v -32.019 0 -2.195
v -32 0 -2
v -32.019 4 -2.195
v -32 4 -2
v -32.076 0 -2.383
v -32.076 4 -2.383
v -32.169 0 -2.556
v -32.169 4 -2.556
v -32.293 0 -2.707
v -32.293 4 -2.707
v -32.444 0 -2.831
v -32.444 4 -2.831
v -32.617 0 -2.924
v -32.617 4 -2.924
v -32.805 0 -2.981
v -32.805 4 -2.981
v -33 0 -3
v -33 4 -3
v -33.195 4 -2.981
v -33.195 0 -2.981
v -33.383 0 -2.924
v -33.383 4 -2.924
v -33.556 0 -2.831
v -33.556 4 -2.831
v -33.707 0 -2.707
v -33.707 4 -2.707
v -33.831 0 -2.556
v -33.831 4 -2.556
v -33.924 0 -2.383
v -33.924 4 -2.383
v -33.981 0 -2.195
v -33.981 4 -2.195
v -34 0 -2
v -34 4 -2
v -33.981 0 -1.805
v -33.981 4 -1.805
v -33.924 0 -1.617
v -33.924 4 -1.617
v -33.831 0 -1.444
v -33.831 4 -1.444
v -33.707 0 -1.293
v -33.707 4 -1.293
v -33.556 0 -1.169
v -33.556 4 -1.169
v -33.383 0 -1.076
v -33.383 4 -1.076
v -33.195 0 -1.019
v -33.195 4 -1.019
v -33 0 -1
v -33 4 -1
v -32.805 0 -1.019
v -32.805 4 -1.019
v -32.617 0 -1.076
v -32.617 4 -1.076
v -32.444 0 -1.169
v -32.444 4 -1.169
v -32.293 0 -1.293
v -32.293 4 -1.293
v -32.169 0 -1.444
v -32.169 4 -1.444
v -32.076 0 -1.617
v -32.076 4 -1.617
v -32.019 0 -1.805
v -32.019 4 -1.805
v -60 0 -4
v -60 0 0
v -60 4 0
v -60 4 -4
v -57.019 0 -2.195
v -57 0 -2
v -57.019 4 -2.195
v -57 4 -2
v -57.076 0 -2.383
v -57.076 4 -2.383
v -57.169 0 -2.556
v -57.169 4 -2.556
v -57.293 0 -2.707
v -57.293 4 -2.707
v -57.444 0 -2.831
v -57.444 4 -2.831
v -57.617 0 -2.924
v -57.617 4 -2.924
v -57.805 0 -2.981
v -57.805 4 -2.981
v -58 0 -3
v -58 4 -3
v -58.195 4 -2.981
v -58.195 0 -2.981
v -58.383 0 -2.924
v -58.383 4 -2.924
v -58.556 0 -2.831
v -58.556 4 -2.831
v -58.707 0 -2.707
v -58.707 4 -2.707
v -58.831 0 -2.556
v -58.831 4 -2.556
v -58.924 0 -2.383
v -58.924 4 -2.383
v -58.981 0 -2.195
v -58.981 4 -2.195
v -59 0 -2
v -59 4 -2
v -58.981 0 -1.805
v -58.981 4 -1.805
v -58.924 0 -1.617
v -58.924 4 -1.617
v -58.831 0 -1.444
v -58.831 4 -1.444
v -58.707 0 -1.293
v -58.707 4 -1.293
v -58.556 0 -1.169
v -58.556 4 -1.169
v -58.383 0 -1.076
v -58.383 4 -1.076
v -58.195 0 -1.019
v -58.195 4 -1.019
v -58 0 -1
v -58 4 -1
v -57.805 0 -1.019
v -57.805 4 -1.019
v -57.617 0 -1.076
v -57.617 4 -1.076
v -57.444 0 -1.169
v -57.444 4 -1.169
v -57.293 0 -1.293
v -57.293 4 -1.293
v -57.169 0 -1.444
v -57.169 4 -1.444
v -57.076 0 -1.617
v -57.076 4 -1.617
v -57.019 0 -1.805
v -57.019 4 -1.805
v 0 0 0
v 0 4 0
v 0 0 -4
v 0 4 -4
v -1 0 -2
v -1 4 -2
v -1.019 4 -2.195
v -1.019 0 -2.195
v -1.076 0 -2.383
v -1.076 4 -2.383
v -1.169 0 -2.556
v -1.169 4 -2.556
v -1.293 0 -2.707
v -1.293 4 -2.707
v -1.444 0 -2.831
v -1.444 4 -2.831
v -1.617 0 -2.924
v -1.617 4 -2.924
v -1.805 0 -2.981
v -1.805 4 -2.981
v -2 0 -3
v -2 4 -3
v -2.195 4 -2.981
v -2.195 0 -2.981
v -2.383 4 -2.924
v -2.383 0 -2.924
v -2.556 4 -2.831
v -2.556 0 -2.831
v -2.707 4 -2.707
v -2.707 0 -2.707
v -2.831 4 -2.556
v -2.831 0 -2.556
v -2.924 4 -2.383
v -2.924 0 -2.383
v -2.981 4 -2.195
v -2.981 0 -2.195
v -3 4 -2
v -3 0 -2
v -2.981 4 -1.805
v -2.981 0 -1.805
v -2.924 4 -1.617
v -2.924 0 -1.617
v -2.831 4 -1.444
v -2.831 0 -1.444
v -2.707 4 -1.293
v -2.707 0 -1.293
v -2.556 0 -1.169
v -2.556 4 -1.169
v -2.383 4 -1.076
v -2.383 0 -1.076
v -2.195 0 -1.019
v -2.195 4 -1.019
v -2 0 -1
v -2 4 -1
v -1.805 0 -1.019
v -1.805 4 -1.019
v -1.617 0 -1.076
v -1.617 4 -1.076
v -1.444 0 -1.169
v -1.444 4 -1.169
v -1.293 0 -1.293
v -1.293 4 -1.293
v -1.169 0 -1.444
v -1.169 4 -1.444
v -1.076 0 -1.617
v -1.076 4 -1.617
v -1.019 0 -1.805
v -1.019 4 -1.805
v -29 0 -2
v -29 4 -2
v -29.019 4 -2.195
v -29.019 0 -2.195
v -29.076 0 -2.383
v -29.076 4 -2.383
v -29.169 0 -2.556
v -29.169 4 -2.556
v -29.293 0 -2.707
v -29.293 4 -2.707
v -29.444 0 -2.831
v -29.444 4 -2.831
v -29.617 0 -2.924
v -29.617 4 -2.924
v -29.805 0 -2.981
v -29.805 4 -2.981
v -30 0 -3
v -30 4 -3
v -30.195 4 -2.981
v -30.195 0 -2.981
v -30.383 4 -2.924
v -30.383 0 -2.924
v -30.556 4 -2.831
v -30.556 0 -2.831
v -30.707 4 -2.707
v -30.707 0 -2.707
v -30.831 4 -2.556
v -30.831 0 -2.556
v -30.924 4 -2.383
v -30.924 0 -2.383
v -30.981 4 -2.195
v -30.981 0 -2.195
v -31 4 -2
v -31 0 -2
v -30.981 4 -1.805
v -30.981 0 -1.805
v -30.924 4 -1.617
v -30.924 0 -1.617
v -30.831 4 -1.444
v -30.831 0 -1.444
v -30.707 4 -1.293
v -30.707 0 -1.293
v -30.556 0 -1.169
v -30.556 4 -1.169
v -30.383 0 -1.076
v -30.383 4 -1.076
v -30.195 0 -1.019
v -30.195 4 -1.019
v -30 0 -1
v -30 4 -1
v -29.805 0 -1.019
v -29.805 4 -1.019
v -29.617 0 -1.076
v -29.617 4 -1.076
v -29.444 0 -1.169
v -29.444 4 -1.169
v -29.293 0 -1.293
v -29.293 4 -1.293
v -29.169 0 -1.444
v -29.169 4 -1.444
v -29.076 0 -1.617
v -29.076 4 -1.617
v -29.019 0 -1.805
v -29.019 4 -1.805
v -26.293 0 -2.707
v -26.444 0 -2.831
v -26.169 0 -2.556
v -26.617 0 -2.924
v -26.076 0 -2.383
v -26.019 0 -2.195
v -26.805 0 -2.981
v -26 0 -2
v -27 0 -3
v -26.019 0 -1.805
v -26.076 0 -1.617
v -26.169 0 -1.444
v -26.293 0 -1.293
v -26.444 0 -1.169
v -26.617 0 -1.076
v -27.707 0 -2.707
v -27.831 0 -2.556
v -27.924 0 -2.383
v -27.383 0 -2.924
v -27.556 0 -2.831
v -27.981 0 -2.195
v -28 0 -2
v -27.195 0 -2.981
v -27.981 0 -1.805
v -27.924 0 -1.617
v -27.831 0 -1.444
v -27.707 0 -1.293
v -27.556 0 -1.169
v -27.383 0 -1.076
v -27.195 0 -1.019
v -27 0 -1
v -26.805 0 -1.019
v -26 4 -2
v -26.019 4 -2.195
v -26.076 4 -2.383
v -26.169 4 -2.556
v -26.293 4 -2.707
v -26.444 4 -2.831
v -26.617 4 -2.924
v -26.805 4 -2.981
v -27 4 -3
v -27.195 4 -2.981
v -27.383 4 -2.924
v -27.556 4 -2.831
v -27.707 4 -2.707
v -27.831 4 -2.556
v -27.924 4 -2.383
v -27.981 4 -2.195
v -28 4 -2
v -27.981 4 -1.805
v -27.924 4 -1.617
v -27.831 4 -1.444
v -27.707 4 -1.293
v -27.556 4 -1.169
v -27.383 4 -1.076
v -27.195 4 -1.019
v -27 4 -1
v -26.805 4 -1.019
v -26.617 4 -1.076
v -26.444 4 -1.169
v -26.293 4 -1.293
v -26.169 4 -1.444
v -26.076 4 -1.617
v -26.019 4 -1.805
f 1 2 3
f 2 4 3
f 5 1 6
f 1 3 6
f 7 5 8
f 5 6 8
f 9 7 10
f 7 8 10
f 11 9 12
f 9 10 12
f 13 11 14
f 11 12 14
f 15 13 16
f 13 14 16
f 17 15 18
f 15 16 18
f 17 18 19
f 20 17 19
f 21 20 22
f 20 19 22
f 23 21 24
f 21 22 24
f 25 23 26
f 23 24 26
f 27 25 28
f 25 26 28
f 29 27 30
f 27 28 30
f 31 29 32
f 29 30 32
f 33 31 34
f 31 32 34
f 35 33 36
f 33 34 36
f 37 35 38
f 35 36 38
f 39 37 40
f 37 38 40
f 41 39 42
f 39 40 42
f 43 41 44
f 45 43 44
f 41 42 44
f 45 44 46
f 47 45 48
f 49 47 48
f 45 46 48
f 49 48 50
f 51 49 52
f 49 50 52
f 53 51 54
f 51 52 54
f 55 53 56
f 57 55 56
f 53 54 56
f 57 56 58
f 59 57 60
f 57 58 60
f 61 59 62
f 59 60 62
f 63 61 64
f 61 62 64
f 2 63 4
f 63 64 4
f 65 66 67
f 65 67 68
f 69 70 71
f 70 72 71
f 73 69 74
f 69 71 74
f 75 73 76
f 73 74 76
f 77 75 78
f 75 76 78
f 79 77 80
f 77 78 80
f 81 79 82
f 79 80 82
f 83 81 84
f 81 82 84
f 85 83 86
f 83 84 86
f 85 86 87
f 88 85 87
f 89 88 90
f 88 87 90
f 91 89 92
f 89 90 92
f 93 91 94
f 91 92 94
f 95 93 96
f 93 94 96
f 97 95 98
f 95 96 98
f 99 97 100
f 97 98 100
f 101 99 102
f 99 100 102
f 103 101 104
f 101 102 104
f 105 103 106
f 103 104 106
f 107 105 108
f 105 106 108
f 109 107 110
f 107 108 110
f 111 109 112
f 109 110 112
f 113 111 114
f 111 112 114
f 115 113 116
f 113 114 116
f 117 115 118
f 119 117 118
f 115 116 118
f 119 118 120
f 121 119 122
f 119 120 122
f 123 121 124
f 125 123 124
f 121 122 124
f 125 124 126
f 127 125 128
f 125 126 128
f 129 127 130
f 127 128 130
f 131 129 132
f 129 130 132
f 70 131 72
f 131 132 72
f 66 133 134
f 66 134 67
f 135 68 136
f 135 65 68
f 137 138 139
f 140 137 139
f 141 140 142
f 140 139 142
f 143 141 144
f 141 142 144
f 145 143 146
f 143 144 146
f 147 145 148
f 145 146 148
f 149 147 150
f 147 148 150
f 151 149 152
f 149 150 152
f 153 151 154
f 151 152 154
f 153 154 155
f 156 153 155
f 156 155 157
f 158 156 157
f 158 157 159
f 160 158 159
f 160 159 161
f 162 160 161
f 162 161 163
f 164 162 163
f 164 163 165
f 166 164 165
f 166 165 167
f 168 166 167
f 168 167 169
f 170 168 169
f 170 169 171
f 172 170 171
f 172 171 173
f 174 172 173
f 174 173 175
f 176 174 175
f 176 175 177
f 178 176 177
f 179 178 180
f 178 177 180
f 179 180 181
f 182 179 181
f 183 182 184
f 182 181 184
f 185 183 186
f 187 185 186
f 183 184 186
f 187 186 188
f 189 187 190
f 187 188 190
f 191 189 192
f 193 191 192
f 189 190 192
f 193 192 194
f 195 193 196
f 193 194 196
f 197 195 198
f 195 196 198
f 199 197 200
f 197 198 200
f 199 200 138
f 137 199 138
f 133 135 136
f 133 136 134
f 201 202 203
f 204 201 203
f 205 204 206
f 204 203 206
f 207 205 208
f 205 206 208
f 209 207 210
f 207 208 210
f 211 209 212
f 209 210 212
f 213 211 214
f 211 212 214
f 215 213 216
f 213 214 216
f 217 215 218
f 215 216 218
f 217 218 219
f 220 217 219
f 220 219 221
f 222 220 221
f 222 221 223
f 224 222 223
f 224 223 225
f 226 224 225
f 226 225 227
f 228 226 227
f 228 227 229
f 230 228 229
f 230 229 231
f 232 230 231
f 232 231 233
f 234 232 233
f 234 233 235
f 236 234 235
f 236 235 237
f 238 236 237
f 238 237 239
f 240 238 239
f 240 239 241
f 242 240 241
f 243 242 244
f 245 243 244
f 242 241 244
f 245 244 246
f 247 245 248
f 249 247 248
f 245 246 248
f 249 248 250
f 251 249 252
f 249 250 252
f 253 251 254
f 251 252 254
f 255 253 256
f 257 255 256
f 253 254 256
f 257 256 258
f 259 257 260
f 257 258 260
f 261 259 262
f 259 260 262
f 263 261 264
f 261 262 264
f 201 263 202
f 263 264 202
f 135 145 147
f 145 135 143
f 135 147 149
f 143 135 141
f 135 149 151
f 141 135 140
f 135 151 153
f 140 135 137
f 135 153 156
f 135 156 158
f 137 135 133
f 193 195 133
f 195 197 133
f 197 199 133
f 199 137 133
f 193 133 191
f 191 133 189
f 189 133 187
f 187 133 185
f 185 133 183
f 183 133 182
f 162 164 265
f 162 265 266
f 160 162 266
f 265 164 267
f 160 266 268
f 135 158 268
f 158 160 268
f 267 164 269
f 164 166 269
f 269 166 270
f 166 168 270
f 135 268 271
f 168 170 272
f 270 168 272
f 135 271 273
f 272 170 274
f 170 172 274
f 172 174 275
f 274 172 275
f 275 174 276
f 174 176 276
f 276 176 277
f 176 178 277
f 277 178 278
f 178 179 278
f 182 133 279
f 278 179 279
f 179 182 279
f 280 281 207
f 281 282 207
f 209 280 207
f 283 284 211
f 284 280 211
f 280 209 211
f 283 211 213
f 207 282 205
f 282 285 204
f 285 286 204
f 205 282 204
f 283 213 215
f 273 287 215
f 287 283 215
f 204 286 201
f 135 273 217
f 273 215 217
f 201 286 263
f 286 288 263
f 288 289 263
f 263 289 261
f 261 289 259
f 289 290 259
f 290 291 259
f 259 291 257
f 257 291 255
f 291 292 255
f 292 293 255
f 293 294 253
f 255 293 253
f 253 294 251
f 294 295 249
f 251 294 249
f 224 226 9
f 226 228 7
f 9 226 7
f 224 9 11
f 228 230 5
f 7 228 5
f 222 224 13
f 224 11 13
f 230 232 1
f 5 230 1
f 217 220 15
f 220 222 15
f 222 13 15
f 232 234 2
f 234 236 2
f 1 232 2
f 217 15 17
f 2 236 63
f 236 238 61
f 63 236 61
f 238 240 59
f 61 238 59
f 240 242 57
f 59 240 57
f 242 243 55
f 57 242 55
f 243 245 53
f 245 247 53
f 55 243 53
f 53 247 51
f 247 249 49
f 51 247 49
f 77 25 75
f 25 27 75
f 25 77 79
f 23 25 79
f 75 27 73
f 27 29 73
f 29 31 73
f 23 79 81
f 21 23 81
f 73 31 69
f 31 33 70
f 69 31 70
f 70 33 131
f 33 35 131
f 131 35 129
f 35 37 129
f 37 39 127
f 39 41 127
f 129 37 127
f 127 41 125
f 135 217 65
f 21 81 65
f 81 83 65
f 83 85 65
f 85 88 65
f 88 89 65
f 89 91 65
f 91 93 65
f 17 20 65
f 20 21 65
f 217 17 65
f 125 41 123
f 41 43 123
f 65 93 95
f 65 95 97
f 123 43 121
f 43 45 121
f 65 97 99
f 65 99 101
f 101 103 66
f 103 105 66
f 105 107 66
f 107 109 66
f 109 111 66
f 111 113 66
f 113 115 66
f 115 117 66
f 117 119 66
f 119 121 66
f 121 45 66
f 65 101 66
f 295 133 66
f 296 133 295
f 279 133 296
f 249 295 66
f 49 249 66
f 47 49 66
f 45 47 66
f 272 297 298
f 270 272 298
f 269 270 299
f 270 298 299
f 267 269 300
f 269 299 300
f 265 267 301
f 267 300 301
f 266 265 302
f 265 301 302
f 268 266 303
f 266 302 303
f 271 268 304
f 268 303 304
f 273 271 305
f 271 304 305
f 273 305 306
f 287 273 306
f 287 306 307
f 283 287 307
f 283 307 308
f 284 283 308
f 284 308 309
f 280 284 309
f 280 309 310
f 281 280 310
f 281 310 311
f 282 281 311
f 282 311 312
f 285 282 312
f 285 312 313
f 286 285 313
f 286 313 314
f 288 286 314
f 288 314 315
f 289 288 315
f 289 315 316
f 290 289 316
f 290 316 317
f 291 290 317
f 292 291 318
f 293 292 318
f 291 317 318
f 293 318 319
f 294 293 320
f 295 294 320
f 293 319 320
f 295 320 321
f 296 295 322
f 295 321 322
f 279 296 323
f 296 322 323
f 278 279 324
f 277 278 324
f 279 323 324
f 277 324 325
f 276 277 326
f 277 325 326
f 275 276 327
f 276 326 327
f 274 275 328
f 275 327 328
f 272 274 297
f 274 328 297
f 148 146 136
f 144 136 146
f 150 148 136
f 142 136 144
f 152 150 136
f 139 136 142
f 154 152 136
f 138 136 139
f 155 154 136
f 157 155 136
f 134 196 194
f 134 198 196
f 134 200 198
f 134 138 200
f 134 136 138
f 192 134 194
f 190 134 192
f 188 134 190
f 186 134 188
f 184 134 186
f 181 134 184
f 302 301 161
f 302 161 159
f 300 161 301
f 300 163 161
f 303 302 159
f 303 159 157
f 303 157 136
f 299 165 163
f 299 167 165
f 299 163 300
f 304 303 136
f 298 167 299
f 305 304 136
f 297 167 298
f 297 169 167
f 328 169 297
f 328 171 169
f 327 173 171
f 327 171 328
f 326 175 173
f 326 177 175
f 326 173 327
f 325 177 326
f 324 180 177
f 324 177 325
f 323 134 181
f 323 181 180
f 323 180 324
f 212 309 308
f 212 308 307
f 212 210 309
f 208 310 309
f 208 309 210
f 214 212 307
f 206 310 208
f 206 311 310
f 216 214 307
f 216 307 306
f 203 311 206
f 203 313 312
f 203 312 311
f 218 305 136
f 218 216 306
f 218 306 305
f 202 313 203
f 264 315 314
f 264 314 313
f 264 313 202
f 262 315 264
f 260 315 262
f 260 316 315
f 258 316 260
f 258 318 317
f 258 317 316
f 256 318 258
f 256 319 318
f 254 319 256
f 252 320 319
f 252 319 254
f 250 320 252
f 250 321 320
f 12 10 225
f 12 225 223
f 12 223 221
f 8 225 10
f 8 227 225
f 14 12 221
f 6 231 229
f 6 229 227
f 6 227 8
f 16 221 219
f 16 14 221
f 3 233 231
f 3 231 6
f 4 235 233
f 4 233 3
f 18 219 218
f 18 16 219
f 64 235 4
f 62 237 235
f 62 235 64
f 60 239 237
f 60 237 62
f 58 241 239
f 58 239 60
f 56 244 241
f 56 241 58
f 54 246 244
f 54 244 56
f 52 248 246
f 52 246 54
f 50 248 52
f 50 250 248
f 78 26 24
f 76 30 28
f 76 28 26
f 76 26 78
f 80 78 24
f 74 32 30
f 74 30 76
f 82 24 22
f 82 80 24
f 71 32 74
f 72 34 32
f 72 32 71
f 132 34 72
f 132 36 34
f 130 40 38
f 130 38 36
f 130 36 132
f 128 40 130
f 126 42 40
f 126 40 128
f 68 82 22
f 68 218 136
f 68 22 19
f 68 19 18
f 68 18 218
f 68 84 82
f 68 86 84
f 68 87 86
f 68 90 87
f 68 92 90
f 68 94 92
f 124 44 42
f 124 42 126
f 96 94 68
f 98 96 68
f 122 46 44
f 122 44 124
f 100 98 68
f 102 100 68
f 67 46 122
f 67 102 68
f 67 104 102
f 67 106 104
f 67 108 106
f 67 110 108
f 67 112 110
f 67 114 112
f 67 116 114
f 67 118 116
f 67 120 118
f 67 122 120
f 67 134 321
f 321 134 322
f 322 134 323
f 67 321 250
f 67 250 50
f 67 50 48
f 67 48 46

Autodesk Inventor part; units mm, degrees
ref_plane "YZ Plane" through (0, 0, 0) normal (1, 0, 0) x (0, 1, 0)
ref_plane "XZ Plane" through (0, 0, 0) normal (0, 1, 0) x (-1, 0, 0)
ref_plane "XY Plane" through (0, 0, 0) normal (0, 0, 1) x (1, 0, 0)
sketch "Sketch1" plane through (0, 0, 0) normal (0, 1, 0) x (-1, 0, 0)
  line L0 (0, 0) -> (60, 0)
  line L1 (60, 0) -> (60, -4)
  line L2 (60, -4) -> (0, -4)
  line L3 (0, -4) -> (0, 0)
  dimension "d0" = 60
  dimension "d1" = 4
extrude "Extrusion1" add sketch "Sketch1" along normal blind 4
sketch "Sketch2" plane through (0, 4, 0) normal (0, 1, 0) x (1, 0, 0)
  line L0 (0, 0) -> (0, 4) projected
  line L1 (0, 2) -> (-2, 2)
  circle A0 centre (-2, 2) radius 1
  line L2 (0, 4) -> (-60, 4) projected
  line L3 (-30, 4) -> (-30, 1.3223)
  circle A1 centre (-58, 2) radius 1
  dimension "d4" = 2
  dimension "d5" = 2
extrude "Extrusion2" cut sketch "Sketch2" against normal blind 4
sketch "Sketch3" plane through (0, 4, 0) normal (0, 1, 0) x (1, 0, 0)
  line L0 (0, 0) -> (0, 4) projected
  line L1 (0, 2) -> (-60, 2)
  line L2 (-60, 4) -> (-60, 0) projected
  circle A0 centre (-30, 2) radius 1
  circle A1 centre (-27, 2) radius 1
  circle A2 centre (-33, 2) radius 1
  circle A3 centre (-30, 2) radius 1
  dimension "d8" = 2
  dimension "d13" = 3
  dimension "d16" = 3
extrude "Extrusion3" cut sketch "Sketch3" against normal blind 10 contours A0 L1 | L1 A0
extrude "Extrusion4" cut sketch "Sketch3" against normal blind 10 contours A1 L1 | L1 A1 | A2 L1 | L1 A2
properties part number "parallel_bar_long_v1"
